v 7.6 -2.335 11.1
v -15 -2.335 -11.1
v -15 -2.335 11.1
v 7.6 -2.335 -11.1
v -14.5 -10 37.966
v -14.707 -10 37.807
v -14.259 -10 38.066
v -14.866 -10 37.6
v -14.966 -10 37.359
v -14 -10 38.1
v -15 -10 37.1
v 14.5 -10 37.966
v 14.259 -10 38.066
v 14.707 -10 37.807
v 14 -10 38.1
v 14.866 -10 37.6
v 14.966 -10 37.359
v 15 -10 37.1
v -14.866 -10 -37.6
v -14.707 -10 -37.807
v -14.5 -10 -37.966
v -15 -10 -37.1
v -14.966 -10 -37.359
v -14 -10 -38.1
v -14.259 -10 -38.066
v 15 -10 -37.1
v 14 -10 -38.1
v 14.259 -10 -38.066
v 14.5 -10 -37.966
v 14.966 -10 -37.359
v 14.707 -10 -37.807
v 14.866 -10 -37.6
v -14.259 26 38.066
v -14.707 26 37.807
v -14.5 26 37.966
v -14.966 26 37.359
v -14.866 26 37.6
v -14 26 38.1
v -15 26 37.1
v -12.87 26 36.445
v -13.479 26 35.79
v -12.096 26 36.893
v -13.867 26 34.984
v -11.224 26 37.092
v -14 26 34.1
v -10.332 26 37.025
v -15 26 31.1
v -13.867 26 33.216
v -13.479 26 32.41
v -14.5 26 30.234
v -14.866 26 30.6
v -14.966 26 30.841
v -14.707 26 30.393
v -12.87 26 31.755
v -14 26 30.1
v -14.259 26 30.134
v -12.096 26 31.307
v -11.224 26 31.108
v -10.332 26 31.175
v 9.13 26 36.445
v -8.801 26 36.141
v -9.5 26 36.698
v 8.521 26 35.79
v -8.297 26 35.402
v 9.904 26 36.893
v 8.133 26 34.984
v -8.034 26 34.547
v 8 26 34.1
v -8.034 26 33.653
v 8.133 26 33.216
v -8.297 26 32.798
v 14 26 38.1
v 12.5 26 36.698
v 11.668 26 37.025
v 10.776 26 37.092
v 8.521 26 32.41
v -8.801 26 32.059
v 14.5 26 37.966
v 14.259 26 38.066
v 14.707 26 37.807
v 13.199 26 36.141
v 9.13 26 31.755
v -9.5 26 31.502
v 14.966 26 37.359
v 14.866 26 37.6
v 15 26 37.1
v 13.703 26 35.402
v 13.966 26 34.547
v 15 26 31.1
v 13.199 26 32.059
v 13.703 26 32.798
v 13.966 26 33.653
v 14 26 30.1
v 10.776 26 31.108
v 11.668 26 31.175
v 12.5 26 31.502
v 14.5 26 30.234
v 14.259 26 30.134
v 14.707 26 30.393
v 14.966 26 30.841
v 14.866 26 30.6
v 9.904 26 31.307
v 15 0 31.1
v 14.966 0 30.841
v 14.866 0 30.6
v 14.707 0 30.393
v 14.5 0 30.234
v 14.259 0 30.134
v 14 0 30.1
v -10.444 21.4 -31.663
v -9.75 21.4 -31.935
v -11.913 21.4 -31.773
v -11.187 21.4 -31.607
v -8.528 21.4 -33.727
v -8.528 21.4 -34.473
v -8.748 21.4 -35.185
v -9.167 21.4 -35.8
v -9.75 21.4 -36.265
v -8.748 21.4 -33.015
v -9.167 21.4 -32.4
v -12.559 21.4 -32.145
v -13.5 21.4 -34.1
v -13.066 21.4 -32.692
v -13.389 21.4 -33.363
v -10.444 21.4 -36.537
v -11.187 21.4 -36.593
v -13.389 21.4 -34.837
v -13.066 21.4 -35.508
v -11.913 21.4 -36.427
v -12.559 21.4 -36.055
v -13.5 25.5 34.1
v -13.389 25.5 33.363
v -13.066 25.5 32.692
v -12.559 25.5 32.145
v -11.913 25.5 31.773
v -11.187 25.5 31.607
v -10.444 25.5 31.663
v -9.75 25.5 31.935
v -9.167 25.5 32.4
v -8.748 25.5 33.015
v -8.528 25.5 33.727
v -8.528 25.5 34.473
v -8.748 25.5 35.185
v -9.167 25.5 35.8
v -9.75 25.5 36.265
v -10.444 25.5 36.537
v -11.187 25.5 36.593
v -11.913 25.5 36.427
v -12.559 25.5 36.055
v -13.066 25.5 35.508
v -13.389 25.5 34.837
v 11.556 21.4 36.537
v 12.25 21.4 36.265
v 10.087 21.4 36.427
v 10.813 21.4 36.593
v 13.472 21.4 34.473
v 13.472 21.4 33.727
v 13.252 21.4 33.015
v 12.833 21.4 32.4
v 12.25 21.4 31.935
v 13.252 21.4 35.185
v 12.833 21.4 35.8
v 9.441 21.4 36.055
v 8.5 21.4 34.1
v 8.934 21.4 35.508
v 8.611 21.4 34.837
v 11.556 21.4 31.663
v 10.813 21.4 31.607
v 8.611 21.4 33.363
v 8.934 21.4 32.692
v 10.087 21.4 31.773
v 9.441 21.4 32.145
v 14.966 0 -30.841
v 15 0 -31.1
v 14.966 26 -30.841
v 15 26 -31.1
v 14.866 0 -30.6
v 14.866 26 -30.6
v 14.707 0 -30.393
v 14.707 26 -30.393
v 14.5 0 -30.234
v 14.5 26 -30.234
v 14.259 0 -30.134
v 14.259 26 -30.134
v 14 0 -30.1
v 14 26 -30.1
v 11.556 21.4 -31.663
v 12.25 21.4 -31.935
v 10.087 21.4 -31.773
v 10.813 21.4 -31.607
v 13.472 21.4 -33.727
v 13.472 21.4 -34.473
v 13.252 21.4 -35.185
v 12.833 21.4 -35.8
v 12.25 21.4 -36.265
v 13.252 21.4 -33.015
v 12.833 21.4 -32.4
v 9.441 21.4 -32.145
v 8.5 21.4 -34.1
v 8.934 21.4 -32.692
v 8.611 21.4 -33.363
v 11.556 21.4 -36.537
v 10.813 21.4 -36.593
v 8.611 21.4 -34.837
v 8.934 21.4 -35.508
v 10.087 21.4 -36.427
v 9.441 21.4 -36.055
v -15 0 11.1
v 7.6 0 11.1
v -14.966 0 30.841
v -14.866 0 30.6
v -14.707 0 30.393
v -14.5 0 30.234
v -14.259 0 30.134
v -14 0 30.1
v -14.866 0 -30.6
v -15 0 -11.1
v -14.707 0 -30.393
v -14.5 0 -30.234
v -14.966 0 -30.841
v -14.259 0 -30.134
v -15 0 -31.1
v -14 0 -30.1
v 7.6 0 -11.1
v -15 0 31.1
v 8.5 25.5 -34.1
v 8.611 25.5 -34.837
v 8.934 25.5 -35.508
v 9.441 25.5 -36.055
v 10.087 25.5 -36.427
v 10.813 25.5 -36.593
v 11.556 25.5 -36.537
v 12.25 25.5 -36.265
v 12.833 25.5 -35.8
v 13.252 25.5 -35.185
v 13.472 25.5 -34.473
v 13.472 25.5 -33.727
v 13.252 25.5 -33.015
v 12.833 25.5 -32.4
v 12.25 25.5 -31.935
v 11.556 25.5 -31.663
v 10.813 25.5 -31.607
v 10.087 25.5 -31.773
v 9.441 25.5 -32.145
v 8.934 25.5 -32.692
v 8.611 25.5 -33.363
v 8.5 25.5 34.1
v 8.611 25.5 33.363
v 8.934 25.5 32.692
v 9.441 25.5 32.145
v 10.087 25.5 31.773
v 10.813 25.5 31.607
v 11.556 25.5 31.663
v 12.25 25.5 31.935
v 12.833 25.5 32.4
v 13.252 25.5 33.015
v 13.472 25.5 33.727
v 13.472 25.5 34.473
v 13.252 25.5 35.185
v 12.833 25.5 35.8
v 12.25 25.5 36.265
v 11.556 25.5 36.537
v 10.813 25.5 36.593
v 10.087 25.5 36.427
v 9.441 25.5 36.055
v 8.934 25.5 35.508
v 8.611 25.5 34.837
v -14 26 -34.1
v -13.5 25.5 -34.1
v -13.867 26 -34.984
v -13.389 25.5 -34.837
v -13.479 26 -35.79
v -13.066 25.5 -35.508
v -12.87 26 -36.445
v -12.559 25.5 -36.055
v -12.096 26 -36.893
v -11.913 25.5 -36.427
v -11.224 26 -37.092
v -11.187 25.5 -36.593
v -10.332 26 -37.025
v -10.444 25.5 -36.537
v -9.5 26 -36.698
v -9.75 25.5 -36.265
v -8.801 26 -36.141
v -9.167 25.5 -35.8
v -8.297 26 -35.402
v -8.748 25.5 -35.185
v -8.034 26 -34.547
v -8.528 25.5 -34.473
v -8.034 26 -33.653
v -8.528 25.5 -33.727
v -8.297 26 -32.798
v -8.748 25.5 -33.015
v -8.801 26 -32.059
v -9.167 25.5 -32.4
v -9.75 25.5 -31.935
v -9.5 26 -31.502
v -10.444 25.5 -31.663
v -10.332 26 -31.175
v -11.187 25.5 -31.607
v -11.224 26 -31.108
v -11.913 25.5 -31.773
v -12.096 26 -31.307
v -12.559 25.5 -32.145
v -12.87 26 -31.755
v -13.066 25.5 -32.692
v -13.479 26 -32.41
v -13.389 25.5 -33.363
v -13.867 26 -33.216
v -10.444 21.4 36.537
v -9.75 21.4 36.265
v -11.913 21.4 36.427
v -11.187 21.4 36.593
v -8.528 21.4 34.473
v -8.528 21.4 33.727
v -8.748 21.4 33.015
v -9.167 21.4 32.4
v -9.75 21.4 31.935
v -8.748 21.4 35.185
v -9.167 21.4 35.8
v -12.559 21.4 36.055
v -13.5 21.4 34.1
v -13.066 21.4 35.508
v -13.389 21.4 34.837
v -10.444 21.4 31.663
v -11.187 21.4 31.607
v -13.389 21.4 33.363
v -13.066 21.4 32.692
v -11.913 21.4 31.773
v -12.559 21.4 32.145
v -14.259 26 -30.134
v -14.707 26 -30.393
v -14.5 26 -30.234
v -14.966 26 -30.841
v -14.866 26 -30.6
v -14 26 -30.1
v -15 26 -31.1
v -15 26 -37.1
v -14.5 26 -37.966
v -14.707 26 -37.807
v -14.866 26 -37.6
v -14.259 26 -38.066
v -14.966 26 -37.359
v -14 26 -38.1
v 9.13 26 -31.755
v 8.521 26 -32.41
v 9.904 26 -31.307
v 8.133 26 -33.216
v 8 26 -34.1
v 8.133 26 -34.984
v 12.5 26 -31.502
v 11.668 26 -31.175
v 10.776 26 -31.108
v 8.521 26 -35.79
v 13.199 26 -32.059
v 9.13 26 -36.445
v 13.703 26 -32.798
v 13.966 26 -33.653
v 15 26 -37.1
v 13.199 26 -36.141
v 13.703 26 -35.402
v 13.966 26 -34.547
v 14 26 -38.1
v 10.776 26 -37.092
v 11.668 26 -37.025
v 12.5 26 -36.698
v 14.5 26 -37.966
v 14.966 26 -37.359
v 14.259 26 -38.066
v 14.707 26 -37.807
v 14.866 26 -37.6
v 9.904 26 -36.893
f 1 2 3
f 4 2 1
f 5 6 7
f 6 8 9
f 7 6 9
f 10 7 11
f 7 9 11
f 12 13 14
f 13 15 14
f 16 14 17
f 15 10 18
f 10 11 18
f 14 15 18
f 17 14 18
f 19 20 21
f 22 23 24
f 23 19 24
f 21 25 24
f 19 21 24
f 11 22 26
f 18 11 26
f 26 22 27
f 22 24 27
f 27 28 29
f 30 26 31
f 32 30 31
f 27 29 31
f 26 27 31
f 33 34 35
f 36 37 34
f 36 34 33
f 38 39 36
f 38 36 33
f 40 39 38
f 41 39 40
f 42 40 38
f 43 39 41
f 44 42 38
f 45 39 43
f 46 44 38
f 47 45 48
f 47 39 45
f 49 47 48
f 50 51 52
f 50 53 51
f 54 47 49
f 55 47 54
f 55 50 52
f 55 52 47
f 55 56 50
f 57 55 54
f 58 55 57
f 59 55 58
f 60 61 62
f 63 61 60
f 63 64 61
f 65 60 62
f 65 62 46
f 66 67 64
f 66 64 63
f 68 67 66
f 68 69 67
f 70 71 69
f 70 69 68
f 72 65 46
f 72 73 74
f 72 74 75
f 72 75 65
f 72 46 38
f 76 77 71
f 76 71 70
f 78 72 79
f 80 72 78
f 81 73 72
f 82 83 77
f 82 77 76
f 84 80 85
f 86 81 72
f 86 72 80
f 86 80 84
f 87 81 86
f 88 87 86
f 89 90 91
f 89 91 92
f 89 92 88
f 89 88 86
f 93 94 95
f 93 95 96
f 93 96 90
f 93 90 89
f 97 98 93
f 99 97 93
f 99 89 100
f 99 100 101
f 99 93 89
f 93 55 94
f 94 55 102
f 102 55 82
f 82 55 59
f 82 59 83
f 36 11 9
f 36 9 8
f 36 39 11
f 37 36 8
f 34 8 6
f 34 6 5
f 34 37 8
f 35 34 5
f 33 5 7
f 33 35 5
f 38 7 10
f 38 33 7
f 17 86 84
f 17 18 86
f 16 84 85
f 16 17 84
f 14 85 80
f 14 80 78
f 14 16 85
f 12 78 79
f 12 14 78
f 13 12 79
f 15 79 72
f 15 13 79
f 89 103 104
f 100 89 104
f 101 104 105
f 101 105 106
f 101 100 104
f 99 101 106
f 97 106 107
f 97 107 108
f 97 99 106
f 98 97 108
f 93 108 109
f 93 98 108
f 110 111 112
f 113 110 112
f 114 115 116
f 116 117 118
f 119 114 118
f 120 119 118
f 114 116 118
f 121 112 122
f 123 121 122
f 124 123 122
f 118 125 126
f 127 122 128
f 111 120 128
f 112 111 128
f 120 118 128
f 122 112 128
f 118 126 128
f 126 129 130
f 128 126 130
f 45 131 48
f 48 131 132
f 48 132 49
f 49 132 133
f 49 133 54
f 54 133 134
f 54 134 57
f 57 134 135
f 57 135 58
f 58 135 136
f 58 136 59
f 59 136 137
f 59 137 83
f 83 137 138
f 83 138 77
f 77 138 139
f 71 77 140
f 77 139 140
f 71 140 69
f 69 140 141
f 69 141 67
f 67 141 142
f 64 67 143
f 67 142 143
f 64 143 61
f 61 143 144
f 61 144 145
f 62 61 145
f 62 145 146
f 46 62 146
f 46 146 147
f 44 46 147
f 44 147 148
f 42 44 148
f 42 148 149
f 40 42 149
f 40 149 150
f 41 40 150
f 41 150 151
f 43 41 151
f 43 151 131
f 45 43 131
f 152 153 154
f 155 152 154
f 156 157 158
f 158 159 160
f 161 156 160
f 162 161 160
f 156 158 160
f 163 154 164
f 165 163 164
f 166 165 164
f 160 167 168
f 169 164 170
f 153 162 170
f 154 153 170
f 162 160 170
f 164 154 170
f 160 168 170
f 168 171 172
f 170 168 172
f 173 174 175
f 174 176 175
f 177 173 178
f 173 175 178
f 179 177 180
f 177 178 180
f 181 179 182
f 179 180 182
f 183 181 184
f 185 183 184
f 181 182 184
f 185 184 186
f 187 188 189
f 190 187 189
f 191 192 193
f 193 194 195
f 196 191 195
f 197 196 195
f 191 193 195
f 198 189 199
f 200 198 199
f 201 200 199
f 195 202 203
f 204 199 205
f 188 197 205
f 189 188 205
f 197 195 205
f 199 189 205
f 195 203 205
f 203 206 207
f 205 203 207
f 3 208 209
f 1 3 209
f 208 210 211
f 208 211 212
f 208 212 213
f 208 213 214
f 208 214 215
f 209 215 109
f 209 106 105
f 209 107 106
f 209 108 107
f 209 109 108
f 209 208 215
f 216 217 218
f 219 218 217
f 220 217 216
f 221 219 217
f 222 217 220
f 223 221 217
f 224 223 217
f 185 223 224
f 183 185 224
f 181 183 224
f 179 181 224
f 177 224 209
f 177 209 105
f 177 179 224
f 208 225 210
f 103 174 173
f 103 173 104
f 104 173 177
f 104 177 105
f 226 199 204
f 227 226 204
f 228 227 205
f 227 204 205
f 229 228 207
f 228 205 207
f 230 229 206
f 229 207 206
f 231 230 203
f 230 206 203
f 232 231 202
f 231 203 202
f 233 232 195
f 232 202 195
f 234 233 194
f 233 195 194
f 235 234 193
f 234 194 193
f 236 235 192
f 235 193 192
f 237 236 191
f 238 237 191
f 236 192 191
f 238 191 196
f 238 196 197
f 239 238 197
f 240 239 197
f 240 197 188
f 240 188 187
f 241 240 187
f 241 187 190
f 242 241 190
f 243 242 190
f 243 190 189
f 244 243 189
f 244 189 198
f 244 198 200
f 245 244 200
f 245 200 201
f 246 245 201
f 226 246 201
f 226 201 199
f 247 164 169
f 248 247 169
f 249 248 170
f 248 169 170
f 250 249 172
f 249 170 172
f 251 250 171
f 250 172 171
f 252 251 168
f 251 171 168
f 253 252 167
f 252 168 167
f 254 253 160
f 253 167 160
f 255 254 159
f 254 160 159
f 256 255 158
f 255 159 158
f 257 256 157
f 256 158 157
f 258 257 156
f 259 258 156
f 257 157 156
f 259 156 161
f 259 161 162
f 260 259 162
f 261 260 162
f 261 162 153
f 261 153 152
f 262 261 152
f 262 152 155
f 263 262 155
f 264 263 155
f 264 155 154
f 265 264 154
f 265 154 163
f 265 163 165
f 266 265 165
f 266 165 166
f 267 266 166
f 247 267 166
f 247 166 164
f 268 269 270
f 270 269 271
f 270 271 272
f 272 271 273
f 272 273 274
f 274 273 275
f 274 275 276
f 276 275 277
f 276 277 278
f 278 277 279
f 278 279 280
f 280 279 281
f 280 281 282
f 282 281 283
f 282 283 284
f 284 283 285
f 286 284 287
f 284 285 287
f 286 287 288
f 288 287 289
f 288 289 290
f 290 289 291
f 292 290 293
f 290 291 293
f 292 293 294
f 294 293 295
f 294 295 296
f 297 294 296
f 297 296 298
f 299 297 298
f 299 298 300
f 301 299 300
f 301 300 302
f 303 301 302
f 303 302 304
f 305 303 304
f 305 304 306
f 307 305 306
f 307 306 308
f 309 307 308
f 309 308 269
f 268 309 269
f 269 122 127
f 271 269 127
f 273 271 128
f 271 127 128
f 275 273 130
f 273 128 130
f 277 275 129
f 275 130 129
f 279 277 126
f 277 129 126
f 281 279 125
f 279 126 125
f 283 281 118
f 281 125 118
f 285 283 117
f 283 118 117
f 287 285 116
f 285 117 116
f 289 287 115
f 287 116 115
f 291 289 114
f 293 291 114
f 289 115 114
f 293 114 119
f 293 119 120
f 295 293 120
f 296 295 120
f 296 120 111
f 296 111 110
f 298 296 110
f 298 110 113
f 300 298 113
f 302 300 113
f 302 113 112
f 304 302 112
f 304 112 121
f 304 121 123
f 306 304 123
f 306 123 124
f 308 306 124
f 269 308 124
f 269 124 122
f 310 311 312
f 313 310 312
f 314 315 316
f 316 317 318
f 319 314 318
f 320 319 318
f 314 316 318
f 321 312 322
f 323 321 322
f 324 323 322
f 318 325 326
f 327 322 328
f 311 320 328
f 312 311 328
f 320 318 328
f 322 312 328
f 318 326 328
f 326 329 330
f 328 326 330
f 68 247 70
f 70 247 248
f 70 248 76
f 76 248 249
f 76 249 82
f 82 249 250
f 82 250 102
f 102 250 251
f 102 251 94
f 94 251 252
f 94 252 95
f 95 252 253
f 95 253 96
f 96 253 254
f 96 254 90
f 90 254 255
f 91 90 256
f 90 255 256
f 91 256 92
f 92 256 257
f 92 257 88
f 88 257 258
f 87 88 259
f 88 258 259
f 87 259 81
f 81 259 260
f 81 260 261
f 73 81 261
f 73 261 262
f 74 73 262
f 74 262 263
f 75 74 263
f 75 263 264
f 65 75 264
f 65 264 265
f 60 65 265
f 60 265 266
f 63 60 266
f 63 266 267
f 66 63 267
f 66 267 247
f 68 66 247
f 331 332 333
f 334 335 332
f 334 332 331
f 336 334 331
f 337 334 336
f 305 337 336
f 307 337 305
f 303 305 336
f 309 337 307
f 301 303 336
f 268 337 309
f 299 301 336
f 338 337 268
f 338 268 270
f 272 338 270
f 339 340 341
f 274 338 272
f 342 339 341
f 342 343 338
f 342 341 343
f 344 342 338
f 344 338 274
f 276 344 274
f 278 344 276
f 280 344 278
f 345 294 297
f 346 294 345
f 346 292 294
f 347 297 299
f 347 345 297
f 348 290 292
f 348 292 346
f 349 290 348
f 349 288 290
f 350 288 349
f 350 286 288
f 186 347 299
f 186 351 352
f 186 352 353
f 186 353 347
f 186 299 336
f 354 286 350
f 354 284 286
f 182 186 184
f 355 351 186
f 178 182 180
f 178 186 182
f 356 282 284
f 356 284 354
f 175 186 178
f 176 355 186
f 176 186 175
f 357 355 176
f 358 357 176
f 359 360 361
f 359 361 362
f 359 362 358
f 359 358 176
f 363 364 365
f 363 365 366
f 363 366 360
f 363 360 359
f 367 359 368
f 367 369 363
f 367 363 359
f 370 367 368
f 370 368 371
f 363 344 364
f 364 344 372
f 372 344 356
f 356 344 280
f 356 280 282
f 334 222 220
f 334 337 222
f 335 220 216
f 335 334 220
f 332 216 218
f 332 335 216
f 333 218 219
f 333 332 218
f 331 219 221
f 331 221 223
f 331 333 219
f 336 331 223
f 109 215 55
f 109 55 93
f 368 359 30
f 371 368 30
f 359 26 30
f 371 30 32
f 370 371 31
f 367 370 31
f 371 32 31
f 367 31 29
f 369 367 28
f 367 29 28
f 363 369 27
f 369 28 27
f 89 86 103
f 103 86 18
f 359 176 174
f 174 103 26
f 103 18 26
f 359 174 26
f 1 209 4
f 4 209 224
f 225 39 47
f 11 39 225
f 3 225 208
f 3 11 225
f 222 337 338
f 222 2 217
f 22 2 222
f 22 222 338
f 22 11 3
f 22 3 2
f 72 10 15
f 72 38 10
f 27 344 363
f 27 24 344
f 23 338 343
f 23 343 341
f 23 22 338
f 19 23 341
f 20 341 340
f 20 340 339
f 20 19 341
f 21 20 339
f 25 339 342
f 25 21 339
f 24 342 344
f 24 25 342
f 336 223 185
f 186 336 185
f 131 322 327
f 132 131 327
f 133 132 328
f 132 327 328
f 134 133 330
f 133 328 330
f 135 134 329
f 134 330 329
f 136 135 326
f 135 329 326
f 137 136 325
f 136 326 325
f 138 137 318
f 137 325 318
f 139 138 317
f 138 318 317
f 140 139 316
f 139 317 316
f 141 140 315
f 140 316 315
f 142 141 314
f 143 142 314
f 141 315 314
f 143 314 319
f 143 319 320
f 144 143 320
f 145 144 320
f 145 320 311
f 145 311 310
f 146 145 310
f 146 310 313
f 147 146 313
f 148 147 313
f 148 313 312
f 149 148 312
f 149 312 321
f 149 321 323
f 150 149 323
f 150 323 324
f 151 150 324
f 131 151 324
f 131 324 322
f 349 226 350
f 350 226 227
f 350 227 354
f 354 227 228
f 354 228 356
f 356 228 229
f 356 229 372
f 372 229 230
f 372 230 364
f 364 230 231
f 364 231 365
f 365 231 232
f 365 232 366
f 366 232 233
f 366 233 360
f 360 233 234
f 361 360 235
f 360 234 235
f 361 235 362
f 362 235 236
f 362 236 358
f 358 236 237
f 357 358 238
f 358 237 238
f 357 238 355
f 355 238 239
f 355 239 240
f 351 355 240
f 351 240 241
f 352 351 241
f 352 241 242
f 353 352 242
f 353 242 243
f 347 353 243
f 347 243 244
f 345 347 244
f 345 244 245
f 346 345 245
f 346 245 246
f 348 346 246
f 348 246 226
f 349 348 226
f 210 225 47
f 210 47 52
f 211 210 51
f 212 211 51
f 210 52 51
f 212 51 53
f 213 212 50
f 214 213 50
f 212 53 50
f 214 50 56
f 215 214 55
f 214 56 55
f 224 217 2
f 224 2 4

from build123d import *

# Parameters (mm, degrees)
SKETCH1_W                       = 30
SKETCH1_H                       = 76.2
BOSS_EXTRUDE1_DEPTH             = 10
SKETCH2_W                       = 22.6
SKETCH2_H                       = 22.2
CUT_EXTRUDE2_DEPTH              = 2.335
SKETCH3_W                       = 30
SKETCH3_H                       = 8
BOSS_EXTRUDE2_DEPTH             = 26
F_5_0MM_DOWEL_HOLE1_D           = 5
F_5_0MM_DOWEL_HOLE1_DEPTH       = 4.6
F_5_0MM_DOWEL_HOLE1_CSINK_D     = 6
F_5_0MM_DOWEL_HOLE1_CSINK_ANGLE = 90
FILLET1_R                       = 1


with BuildPart() as part:
    # Sketch1 → Boss-Extrude1 (new body)
    with BuildSketch(Plane(origin=(0, 0, 0), x_dir=(1, 0, 0), z_dir=(0, 1, 0))):
        Rectangle(SKETCH1_W, SKETCH1_H)
    extrude(amount=-BOSS_EXTRUDE1_DEPTH)

    # Sketch2 → Cut-Extrude2 (cut)
    with BuildSketch(Plane(origin=(0, 0, 0), x_dir=(1, 0, 0), z_dir=(0, 1, 0))):
        with Locations((-3.7, 0)):
            Rectangle(SKETCH2_W, SKETCH2_H)
    extrude(amount=-CUT_EXTRUDE2_DEPTH, mode=Mode.SUBTRACT)

    # Sketch3 → Boss-Extrude2 (add)
    with BuildSketch(Plane(origin=(0, 0, 0), x_dir=(1, 0, 0), z_dir=(0, 1, 0))):
        with Locations((0, 34.1)):
            Rectangle(SKETCH3_W, SKETCH3_H)
        with Locations((0, -34.1)):
            Rectangle(SKETCH3_W, SKETCH3_H)
    extrude(amount=BOSS_EXTRUDE2_DEPTH)

    # Ø5.0mm Dowel Hole1
    with Locations(Plane(origin=(0, 26, 0), x_dir=(1, 0, 0), z_dir=(0, 1, 0))):
        with Locations((-11, 34.1), (11, 34.1), (11, -34.1), (-11, -34.1)):
            CounterSinkHole(F_5_0MM_DOWEL_HOLE1_D / 2, F_5_0MM_DOWEL_HOLE1_CSINK_D / 2, depth=F_5_0MM_DOWEL_HOLE1_DEPTH, counter_sink_angle=F_5_0MM_DOWEL_HOLE1_CSINK_ANGLE)

    # Fillet1
    fillet1_edges = [part.edges().sort_by_distance(p)[0] for p in [
        (-15, 13, -30.1),
        (15, 13, -30.1),
        (-15, 13, 30.1),
        (15, 13, 30.1),
        (-15, 8, -38.1),
        (15, 8, -38.1),
        (15, 8, 38.1),
        (-15, 8, 38.1),
    ]]
    fillet(fillet1_edges, radius=FILLET1_R)


solid = part.part
